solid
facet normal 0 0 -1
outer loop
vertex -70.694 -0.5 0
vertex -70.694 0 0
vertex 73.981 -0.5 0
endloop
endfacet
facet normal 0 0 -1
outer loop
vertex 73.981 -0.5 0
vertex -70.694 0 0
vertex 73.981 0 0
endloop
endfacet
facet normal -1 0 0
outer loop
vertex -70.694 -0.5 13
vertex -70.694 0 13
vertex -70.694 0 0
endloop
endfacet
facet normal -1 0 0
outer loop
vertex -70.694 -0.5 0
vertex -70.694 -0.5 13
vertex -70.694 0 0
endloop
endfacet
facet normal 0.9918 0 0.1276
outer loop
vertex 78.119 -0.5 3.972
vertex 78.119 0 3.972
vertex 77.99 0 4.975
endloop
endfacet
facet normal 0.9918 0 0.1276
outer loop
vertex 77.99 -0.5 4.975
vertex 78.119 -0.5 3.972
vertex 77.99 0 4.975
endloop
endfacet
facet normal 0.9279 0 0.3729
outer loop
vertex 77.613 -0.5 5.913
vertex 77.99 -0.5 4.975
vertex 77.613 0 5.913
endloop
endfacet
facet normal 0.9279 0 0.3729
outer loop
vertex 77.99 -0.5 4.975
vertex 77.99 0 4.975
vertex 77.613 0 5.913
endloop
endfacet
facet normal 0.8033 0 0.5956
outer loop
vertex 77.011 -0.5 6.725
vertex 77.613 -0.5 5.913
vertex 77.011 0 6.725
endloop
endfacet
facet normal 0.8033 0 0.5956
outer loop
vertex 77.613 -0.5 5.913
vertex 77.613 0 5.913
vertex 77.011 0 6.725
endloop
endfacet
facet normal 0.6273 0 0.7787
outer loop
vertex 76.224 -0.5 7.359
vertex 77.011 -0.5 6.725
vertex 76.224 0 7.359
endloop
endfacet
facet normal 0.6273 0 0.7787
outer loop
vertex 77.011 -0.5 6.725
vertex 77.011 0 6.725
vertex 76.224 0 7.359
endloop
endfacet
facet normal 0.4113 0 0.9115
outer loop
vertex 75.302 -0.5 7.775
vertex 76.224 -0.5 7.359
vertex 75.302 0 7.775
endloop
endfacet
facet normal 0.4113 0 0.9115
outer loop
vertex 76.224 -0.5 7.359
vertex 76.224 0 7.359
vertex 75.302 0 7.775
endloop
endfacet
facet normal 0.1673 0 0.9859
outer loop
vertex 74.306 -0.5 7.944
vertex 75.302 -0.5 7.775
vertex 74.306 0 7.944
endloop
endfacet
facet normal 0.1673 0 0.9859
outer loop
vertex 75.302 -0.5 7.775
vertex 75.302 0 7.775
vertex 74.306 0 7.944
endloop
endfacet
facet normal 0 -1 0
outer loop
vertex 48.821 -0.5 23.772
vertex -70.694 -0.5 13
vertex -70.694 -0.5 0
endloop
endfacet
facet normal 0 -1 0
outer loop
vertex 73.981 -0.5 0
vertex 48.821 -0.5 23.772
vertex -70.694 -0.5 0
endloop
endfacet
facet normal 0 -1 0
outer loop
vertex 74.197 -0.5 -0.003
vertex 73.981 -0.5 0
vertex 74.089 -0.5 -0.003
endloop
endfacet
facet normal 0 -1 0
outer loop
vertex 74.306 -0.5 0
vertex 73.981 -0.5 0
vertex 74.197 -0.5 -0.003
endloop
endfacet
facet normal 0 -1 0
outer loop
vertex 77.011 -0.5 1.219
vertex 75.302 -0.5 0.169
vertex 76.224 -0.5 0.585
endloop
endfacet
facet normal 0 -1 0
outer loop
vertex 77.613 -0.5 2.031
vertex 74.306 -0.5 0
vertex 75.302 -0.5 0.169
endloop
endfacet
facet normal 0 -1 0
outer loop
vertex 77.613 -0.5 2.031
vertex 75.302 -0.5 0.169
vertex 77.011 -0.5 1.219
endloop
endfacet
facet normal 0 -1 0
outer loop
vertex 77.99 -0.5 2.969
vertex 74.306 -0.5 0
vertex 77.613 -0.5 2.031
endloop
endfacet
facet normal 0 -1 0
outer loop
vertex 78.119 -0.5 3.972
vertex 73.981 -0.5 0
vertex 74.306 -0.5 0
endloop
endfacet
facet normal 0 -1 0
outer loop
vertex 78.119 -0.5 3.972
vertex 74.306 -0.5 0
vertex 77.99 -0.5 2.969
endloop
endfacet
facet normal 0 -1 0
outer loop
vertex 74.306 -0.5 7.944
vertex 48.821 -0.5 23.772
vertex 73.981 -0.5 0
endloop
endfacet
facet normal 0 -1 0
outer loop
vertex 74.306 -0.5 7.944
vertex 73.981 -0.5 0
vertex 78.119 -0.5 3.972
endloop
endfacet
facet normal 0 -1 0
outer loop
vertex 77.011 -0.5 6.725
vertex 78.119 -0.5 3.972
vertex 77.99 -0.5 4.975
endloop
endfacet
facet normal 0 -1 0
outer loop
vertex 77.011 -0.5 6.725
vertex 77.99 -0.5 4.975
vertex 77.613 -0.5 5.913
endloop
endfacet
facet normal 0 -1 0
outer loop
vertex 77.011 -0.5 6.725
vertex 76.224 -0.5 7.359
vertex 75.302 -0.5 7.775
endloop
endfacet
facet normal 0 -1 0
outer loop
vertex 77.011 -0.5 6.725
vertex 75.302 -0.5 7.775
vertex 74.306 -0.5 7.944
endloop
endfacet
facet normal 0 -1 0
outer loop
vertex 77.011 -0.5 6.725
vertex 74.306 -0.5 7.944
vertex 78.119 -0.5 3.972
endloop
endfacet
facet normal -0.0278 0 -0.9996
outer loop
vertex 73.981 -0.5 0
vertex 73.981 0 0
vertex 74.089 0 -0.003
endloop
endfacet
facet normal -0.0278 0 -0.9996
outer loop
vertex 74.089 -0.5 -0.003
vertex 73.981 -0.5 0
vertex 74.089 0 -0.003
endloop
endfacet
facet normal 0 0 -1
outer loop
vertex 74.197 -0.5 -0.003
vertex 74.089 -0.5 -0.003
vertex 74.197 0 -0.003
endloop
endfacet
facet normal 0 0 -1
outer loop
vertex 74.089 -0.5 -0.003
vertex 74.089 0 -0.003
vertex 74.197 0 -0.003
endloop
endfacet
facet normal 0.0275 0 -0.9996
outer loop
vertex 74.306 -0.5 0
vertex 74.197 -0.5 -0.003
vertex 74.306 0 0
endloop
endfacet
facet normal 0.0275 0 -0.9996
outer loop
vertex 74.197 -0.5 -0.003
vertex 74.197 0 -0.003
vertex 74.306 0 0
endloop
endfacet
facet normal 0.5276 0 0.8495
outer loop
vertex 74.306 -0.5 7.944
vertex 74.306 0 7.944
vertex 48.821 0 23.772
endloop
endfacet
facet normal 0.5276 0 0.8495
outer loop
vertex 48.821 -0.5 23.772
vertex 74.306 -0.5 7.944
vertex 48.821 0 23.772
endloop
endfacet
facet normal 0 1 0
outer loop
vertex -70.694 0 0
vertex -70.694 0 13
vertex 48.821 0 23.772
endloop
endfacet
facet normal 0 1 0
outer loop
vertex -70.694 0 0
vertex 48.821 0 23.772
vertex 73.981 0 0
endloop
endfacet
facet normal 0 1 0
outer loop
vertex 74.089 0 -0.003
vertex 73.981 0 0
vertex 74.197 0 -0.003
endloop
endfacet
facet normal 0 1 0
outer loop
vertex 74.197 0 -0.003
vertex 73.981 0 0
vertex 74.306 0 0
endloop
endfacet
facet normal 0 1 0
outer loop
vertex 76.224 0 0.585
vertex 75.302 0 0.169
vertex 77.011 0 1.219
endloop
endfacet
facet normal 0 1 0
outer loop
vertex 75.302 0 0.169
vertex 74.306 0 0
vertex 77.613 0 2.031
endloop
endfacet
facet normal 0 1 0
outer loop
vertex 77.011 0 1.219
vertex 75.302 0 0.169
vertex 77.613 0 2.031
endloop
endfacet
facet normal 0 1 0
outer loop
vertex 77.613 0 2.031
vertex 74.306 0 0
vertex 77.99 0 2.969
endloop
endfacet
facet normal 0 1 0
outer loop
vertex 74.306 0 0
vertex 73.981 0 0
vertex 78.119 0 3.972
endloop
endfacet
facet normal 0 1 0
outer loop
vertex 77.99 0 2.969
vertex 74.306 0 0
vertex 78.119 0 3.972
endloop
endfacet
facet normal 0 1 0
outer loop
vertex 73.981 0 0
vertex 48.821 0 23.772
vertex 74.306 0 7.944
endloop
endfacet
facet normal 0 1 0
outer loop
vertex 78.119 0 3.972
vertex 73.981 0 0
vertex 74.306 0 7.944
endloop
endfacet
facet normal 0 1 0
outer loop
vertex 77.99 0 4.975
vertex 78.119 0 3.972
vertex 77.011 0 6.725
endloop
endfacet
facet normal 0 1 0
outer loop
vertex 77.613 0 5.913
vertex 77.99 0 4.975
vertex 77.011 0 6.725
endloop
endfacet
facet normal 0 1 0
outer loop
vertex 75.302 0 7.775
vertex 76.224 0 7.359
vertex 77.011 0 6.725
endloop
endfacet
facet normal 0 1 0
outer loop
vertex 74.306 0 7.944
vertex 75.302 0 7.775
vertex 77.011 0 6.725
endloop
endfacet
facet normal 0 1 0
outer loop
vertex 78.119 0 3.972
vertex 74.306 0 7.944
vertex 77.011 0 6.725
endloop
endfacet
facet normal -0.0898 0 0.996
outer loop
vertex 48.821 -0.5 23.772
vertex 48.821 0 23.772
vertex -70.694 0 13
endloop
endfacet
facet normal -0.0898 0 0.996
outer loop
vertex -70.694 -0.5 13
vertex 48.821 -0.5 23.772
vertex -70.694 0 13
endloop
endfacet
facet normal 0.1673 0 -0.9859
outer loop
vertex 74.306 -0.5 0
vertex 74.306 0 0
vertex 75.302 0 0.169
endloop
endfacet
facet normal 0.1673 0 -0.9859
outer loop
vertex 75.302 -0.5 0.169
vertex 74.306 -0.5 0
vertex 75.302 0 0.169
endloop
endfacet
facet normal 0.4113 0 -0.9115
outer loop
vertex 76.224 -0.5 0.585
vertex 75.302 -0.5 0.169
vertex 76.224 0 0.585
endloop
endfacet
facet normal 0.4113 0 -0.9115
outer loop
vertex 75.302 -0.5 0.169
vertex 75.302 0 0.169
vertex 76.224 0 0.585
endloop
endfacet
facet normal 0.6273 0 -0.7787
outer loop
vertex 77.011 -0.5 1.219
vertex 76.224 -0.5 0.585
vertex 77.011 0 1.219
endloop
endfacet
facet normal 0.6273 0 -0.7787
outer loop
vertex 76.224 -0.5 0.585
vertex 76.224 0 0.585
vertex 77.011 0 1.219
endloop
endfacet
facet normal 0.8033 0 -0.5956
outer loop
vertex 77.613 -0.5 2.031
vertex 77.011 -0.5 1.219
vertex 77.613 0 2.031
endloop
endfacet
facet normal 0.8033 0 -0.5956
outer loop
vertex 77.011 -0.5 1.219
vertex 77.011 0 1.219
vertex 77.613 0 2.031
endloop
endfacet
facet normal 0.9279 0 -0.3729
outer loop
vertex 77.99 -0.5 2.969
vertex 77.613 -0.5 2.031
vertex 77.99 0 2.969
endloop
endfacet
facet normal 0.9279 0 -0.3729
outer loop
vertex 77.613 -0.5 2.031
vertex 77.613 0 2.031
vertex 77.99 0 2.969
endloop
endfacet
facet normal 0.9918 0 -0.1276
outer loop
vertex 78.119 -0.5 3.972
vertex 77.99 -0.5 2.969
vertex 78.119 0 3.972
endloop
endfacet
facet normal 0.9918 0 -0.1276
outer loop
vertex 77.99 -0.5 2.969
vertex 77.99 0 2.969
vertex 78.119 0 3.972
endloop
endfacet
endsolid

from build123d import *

# Parameters (mm, degrees)
F1_DEPTH = 0.5


with BuildPart() as f1:
    # F0 (on Front) → F1 (new body)
    with BuildSketch(Plane.XZ):
        with BuildLine():
            ThreePointArc((73.980978, 0), (74.14326, -0.003314), (74.305542, 0))
            Line((74.305542, 0), (73.980978, 0))
        make_face()
        with BuildLine():
            Line((73.980978, 0), (74.305542, 0))
            ThreePointArc((74.305542, 0), (77.011037, 1.219003), (78.118579, 3.972005))
            ThreePointArc((78.118579, 3.972005), (77.011037, 6.725007), (74.305542, 7.944011))
            ThreePointArc((74.305542, 7.944011), (70.171255, 4.134287), (73.980978, 0))
        make_face()
        with BuildLine():
            Line((-70.694458, 0), (73.980978, 0))
            ThreePointArc((73.980978, 0), (70.171255, 4.134287), (74.305542, 7.944011))
            Line((74.305542, 7.944011), (48.821039, 23.772469))
            Line((48.821039, 23.772469), (-70.694458, 13))
            Line((-70.694458, 13), (-70.694458, 0))
        make_face()
    extrude(amount=F1_DEPTH)


solid = f1.part
